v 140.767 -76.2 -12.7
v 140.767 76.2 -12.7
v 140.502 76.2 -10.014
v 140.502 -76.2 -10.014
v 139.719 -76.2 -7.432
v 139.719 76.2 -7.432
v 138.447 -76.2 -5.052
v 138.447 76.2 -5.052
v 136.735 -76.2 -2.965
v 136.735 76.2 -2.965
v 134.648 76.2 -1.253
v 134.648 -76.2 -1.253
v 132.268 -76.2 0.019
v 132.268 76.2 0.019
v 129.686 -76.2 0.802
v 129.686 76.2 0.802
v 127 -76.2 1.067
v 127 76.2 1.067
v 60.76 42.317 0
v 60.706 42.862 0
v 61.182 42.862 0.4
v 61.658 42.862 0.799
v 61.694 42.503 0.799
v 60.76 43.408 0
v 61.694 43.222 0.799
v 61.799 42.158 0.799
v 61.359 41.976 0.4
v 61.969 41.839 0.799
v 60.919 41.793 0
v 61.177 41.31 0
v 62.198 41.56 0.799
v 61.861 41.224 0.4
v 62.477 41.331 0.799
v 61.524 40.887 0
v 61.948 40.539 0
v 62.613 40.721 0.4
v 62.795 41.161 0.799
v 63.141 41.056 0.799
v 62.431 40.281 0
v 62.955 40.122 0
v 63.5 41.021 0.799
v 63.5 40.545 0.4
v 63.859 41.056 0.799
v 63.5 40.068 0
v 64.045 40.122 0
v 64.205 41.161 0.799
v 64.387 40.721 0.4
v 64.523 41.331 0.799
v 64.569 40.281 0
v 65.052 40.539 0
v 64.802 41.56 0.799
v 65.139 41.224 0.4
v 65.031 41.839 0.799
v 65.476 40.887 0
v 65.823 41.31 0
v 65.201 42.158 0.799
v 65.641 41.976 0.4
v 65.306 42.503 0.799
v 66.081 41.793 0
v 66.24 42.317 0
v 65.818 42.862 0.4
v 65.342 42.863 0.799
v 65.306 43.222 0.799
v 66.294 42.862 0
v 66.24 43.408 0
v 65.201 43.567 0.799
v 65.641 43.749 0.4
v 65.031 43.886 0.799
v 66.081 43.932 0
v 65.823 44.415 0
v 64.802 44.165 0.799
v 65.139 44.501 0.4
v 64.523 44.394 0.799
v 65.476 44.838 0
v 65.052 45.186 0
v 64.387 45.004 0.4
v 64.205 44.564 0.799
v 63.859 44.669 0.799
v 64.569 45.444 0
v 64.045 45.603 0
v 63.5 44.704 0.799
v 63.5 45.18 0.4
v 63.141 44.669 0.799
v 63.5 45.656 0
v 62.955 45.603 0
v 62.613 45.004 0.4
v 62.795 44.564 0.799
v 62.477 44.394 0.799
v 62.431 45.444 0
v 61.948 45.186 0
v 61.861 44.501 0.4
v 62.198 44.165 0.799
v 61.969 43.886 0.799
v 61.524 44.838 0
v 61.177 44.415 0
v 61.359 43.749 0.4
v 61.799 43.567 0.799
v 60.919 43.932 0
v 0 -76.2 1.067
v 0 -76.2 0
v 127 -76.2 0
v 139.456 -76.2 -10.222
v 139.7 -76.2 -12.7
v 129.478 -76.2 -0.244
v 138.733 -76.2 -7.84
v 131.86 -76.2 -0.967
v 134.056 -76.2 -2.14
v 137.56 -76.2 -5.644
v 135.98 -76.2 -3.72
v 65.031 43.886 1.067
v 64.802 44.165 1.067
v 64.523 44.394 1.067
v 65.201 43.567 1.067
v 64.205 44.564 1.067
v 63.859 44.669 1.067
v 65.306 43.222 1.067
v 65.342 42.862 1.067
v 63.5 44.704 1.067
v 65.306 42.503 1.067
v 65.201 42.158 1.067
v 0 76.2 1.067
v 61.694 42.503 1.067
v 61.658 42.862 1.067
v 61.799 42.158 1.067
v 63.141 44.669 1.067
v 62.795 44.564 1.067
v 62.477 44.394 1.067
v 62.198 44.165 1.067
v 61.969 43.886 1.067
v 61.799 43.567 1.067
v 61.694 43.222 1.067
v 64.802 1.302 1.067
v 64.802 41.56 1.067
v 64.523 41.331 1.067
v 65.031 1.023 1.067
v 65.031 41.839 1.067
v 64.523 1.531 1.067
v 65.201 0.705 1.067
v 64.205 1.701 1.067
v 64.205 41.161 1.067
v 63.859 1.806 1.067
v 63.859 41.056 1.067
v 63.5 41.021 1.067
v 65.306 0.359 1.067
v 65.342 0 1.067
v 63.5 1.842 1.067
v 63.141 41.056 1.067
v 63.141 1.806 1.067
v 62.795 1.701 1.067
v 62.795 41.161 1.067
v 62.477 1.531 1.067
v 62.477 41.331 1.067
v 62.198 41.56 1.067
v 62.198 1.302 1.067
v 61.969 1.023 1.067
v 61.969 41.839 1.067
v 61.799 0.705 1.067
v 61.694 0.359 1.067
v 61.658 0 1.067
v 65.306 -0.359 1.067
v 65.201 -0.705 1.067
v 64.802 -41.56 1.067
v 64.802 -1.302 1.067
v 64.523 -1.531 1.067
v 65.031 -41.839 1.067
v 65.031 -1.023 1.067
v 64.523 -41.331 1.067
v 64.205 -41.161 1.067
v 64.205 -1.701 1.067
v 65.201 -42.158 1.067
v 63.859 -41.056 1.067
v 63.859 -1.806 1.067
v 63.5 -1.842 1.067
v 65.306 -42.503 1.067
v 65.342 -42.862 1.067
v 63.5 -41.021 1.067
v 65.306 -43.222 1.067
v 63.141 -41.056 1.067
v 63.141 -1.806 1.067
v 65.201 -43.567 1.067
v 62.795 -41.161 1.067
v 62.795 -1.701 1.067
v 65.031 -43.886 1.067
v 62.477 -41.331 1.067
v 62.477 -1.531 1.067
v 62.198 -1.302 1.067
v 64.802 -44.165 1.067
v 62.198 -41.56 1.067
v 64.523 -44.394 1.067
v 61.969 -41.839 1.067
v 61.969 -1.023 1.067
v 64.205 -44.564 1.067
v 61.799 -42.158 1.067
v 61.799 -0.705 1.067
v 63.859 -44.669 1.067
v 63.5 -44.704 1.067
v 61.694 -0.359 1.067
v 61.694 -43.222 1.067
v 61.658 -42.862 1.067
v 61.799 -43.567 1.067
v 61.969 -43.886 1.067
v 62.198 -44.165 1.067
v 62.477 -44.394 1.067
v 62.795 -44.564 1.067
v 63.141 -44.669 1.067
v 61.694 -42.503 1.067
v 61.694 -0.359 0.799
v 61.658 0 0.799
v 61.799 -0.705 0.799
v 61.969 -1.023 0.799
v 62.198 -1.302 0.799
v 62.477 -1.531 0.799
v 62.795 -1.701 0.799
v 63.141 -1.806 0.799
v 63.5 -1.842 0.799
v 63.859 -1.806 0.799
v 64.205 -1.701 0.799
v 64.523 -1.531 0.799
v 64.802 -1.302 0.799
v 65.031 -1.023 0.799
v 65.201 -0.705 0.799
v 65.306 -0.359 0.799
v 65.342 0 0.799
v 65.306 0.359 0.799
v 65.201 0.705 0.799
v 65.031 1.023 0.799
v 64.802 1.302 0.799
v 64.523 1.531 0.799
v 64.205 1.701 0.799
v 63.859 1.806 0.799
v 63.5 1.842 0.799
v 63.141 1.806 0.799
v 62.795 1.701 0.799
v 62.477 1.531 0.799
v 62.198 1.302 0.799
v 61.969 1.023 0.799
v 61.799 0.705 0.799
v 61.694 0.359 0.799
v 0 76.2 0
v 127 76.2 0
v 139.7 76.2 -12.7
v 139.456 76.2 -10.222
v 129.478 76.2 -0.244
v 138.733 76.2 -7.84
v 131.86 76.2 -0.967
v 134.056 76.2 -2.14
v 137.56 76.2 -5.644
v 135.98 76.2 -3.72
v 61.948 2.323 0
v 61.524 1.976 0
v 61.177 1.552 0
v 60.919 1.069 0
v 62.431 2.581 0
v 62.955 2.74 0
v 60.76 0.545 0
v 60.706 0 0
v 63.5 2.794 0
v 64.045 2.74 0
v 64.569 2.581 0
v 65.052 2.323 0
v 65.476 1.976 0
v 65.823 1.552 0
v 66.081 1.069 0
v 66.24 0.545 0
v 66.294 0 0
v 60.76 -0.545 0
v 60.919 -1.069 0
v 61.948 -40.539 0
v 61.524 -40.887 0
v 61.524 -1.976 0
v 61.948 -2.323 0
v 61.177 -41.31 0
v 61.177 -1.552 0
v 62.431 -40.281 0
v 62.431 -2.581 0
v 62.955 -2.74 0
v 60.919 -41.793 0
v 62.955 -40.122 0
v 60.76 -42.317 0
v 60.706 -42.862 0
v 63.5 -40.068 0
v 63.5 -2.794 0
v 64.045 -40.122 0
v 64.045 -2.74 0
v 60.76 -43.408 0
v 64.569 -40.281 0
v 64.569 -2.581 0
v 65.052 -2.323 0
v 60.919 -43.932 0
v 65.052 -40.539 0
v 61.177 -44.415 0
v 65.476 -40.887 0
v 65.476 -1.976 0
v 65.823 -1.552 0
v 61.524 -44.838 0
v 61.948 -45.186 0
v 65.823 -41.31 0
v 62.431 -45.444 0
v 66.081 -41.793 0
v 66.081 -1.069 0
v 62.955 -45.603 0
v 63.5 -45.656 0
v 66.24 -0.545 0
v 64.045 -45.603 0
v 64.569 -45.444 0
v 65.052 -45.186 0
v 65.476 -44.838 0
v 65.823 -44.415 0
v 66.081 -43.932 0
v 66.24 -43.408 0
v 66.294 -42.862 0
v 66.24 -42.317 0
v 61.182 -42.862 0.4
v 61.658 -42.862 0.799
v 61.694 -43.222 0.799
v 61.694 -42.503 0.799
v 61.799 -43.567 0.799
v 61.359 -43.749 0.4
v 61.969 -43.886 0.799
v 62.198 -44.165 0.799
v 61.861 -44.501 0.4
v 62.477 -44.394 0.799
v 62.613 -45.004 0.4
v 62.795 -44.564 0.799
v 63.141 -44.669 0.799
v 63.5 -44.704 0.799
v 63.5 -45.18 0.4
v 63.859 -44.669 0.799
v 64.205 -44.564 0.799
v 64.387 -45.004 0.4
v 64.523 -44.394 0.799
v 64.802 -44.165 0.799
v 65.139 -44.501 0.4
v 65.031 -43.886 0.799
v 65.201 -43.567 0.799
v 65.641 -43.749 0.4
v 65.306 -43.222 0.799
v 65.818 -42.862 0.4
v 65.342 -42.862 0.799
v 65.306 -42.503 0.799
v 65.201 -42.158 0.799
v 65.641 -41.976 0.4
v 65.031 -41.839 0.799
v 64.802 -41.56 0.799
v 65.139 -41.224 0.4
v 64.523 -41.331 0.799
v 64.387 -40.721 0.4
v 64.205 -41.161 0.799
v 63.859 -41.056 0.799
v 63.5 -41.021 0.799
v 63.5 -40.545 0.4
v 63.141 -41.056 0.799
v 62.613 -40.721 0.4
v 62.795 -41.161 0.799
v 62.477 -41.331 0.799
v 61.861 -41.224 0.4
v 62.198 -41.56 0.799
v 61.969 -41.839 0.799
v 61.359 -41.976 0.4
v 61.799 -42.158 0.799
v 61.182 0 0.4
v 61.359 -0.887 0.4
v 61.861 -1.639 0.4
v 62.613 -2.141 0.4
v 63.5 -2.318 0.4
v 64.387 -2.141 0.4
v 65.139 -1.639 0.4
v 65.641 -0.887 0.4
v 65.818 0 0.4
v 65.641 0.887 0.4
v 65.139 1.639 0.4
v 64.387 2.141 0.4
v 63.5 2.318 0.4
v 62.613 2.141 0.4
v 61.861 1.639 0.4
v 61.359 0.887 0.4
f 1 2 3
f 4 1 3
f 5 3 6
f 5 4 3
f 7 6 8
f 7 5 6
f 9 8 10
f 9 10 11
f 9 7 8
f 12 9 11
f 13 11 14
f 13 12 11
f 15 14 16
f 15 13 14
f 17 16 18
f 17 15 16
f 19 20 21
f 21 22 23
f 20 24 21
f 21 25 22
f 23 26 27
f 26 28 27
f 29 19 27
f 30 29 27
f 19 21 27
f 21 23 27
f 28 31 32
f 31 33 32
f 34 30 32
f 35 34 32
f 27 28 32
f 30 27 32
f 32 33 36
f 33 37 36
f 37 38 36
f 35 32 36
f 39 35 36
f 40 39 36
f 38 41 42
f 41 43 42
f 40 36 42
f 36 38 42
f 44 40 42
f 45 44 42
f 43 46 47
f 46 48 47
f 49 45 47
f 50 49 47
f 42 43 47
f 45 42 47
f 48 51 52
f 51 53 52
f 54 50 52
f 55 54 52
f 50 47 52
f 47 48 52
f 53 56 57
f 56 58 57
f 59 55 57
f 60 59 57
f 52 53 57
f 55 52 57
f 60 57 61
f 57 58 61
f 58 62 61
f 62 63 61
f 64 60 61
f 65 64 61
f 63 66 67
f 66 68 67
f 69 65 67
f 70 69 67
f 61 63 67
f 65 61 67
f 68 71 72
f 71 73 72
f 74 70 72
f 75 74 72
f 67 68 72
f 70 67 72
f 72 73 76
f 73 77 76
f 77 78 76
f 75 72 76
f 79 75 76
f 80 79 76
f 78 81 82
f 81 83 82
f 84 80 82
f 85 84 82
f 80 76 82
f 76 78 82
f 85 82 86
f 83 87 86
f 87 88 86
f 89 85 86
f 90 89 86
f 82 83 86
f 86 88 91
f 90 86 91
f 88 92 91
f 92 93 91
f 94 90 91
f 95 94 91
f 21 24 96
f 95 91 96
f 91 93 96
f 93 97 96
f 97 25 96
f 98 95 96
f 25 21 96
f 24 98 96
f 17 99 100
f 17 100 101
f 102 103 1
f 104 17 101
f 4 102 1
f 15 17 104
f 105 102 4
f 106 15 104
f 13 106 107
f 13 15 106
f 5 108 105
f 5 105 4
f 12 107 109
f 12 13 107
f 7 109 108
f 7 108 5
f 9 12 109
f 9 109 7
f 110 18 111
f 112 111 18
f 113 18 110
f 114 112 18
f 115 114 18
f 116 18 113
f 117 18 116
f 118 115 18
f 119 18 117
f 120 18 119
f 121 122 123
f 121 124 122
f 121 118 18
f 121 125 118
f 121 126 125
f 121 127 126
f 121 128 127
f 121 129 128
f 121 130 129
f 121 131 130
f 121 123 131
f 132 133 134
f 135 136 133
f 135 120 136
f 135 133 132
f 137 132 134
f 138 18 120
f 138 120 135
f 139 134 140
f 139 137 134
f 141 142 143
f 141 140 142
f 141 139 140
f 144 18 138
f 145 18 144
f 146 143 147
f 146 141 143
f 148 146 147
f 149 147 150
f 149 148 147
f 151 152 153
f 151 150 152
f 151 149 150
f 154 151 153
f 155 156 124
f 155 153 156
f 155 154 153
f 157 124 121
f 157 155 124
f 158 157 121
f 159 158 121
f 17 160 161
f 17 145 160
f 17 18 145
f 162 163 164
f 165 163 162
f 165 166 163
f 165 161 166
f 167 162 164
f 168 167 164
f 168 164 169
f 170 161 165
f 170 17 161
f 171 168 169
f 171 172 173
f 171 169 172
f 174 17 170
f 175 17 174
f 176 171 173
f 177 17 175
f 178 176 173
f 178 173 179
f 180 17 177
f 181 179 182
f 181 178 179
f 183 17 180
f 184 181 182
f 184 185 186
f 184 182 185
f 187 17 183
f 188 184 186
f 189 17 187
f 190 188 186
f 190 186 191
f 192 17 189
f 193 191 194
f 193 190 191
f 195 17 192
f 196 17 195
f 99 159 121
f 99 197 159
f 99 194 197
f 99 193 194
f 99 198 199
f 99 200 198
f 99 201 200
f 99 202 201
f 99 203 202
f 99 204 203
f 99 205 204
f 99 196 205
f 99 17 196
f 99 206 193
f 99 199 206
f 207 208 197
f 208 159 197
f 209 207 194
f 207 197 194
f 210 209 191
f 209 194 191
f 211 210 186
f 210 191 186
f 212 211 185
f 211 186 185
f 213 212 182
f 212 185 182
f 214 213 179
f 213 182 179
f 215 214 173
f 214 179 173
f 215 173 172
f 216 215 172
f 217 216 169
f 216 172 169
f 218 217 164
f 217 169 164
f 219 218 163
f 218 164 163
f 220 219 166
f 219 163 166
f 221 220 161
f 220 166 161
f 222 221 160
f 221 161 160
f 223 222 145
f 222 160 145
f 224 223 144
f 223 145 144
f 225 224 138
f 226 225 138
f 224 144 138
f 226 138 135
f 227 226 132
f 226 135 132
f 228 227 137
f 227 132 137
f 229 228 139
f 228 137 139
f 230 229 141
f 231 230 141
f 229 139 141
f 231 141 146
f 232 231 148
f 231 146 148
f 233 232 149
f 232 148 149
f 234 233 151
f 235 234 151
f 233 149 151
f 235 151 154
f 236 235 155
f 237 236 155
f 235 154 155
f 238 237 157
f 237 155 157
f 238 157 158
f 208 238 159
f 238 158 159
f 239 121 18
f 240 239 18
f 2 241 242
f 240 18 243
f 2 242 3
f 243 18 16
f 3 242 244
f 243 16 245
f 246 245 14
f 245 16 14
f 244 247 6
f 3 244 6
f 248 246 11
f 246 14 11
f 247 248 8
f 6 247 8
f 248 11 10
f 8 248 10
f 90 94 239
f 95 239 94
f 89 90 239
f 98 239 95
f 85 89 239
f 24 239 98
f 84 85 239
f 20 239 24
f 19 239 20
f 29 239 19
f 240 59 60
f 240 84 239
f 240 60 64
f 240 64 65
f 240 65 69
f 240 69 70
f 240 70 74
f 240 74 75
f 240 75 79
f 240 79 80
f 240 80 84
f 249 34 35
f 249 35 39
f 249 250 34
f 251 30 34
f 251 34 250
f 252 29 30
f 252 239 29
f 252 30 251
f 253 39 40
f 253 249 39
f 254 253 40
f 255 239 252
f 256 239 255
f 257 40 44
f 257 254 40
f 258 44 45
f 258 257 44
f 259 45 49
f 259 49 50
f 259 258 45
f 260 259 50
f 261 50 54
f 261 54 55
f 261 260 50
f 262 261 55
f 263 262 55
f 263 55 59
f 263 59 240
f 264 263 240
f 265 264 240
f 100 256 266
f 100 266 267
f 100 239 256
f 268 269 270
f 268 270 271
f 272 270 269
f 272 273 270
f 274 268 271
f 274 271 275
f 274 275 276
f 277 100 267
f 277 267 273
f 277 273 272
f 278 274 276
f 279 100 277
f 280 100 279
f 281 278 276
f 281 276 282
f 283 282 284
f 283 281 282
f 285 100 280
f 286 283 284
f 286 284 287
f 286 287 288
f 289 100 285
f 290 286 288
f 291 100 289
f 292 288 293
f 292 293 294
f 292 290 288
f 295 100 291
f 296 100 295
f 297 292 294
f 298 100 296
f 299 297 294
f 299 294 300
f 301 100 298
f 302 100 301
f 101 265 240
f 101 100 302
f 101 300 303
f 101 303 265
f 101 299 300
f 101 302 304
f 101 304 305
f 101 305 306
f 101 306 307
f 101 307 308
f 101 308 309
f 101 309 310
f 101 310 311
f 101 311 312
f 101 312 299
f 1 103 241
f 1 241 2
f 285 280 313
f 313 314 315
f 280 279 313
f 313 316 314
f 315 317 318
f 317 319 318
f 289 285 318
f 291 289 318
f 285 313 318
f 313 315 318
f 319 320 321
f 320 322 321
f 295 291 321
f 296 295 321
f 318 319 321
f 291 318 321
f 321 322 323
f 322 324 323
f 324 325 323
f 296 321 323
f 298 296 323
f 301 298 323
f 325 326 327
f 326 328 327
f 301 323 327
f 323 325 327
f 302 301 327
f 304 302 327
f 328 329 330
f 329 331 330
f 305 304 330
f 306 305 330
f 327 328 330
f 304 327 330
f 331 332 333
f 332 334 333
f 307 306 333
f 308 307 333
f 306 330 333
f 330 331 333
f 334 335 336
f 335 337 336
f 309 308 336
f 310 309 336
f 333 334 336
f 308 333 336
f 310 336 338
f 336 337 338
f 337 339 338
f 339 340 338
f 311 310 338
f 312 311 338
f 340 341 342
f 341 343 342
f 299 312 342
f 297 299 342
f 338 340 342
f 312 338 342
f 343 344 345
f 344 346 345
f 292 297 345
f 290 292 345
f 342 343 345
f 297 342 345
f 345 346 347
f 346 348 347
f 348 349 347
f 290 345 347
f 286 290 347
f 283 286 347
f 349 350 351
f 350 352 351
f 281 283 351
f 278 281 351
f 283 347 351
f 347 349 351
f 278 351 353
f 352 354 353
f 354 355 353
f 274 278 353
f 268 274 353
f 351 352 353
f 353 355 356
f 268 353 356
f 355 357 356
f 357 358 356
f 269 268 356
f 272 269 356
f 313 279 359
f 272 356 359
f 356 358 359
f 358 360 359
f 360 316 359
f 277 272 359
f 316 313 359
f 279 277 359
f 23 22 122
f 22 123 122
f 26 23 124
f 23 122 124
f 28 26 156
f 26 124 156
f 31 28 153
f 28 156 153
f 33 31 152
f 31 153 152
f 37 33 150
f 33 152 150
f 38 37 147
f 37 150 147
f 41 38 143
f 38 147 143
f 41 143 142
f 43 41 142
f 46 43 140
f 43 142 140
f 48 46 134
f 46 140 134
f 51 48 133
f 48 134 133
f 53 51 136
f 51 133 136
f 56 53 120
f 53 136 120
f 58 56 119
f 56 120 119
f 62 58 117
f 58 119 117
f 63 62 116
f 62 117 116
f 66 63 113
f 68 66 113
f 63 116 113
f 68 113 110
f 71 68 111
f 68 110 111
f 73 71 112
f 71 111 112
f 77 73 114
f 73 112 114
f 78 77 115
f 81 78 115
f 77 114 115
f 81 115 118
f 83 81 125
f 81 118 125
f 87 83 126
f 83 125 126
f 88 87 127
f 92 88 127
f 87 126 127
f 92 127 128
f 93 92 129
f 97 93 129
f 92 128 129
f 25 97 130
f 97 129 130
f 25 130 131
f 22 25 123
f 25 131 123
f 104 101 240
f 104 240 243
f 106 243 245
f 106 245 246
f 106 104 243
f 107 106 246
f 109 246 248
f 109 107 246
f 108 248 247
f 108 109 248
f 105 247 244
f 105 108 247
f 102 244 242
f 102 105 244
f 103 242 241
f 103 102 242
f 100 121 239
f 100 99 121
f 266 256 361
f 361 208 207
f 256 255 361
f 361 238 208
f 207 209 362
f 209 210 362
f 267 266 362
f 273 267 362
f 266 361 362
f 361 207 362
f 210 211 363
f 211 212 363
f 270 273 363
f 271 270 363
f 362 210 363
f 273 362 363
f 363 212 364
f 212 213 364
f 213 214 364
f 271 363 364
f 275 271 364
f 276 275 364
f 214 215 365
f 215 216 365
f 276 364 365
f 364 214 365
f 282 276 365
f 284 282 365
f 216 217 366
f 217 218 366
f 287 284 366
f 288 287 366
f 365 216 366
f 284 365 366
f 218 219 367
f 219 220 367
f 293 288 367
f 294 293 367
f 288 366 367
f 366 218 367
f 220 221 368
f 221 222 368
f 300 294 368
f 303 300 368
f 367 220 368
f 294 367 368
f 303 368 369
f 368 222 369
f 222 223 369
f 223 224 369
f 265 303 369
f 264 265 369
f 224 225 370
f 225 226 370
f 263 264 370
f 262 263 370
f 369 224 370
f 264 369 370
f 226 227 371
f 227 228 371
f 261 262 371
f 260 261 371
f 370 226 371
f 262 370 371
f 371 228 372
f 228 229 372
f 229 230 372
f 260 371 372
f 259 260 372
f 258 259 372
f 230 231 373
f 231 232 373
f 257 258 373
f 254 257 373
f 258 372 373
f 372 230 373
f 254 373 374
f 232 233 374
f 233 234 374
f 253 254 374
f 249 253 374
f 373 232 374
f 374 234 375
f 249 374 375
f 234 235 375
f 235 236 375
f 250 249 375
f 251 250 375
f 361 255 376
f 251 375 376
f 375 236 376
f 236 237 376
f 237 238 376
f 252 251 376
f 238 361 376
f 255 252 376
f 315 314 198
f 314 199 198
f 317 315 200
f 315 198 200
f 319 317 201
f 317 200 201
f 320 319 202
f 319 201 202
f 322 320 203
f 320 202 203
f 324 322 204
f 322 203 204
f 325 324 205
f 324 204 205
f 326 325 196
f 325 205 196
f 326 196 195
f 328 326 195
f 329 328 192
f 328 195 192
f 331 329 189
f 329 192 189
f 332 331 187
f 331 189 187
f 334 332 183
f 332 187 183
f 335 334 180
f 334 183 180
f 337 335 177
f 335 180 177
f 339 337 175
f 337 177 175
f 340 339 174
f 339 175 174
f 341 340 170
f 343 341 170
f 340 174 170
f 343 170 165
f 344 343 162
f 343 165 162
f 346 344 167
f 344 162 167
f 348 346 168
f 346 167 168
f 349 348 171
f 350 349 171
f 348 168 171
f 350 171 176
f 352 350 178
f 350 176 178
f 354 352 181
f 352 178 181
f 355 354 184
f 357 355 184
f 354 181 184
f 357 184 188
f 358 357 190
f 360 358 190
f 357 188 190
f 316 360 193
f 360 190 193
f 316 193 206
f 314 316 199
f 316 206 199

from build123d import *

# Parameters (mm, degrees)
F1_DEPTH       = 76.2
F1_DEPTH_BACK  = 76.2
F3_D           = 3.683
F3_CSINK_D     = 5.588
F3_CSINK_ANGLE = 100


with BuildPart() as f1:
    # F0 (on Front) → F1 (new body, two sides)
    with BuildSketch(Plane.XZ) as f1_sk:
        with BuildLine():
            Line((0, 1.0668), (0, 0))
            Line((0, 0), (127, 0))
            ThreePointArc((127, 0), (135.980256, -3.719744), (139.7, -12.7))
            Line((139.7, -12.7), (140.7668, -12.7))
            ThreePointArc((140.7668, -12.7), (136.734598, -2.965402), (127, 1.0668))
            Line((127, 1.0668), (0, 1.0668))
        make_face()
    extrude(amount=F1_DEPTH)
    extrude(f1_sk.sketch, amount=-F1_DEPTH_BACK)

    # F3 (through all)
    with Locations(Plane(origin=(0, 0, 0), x_dir=(1, 0, 0), z_dir=(0, 0, -1))):
        with Locations((63.5, 42.8625), (63.5, 0), (63.5, -42.8625)):
            CounterSinkHole(F3_D / 2, F3_CSINK_D / 2, counter_sink_angle=F3_CSINK_ANGLE)


solid = f1.part
